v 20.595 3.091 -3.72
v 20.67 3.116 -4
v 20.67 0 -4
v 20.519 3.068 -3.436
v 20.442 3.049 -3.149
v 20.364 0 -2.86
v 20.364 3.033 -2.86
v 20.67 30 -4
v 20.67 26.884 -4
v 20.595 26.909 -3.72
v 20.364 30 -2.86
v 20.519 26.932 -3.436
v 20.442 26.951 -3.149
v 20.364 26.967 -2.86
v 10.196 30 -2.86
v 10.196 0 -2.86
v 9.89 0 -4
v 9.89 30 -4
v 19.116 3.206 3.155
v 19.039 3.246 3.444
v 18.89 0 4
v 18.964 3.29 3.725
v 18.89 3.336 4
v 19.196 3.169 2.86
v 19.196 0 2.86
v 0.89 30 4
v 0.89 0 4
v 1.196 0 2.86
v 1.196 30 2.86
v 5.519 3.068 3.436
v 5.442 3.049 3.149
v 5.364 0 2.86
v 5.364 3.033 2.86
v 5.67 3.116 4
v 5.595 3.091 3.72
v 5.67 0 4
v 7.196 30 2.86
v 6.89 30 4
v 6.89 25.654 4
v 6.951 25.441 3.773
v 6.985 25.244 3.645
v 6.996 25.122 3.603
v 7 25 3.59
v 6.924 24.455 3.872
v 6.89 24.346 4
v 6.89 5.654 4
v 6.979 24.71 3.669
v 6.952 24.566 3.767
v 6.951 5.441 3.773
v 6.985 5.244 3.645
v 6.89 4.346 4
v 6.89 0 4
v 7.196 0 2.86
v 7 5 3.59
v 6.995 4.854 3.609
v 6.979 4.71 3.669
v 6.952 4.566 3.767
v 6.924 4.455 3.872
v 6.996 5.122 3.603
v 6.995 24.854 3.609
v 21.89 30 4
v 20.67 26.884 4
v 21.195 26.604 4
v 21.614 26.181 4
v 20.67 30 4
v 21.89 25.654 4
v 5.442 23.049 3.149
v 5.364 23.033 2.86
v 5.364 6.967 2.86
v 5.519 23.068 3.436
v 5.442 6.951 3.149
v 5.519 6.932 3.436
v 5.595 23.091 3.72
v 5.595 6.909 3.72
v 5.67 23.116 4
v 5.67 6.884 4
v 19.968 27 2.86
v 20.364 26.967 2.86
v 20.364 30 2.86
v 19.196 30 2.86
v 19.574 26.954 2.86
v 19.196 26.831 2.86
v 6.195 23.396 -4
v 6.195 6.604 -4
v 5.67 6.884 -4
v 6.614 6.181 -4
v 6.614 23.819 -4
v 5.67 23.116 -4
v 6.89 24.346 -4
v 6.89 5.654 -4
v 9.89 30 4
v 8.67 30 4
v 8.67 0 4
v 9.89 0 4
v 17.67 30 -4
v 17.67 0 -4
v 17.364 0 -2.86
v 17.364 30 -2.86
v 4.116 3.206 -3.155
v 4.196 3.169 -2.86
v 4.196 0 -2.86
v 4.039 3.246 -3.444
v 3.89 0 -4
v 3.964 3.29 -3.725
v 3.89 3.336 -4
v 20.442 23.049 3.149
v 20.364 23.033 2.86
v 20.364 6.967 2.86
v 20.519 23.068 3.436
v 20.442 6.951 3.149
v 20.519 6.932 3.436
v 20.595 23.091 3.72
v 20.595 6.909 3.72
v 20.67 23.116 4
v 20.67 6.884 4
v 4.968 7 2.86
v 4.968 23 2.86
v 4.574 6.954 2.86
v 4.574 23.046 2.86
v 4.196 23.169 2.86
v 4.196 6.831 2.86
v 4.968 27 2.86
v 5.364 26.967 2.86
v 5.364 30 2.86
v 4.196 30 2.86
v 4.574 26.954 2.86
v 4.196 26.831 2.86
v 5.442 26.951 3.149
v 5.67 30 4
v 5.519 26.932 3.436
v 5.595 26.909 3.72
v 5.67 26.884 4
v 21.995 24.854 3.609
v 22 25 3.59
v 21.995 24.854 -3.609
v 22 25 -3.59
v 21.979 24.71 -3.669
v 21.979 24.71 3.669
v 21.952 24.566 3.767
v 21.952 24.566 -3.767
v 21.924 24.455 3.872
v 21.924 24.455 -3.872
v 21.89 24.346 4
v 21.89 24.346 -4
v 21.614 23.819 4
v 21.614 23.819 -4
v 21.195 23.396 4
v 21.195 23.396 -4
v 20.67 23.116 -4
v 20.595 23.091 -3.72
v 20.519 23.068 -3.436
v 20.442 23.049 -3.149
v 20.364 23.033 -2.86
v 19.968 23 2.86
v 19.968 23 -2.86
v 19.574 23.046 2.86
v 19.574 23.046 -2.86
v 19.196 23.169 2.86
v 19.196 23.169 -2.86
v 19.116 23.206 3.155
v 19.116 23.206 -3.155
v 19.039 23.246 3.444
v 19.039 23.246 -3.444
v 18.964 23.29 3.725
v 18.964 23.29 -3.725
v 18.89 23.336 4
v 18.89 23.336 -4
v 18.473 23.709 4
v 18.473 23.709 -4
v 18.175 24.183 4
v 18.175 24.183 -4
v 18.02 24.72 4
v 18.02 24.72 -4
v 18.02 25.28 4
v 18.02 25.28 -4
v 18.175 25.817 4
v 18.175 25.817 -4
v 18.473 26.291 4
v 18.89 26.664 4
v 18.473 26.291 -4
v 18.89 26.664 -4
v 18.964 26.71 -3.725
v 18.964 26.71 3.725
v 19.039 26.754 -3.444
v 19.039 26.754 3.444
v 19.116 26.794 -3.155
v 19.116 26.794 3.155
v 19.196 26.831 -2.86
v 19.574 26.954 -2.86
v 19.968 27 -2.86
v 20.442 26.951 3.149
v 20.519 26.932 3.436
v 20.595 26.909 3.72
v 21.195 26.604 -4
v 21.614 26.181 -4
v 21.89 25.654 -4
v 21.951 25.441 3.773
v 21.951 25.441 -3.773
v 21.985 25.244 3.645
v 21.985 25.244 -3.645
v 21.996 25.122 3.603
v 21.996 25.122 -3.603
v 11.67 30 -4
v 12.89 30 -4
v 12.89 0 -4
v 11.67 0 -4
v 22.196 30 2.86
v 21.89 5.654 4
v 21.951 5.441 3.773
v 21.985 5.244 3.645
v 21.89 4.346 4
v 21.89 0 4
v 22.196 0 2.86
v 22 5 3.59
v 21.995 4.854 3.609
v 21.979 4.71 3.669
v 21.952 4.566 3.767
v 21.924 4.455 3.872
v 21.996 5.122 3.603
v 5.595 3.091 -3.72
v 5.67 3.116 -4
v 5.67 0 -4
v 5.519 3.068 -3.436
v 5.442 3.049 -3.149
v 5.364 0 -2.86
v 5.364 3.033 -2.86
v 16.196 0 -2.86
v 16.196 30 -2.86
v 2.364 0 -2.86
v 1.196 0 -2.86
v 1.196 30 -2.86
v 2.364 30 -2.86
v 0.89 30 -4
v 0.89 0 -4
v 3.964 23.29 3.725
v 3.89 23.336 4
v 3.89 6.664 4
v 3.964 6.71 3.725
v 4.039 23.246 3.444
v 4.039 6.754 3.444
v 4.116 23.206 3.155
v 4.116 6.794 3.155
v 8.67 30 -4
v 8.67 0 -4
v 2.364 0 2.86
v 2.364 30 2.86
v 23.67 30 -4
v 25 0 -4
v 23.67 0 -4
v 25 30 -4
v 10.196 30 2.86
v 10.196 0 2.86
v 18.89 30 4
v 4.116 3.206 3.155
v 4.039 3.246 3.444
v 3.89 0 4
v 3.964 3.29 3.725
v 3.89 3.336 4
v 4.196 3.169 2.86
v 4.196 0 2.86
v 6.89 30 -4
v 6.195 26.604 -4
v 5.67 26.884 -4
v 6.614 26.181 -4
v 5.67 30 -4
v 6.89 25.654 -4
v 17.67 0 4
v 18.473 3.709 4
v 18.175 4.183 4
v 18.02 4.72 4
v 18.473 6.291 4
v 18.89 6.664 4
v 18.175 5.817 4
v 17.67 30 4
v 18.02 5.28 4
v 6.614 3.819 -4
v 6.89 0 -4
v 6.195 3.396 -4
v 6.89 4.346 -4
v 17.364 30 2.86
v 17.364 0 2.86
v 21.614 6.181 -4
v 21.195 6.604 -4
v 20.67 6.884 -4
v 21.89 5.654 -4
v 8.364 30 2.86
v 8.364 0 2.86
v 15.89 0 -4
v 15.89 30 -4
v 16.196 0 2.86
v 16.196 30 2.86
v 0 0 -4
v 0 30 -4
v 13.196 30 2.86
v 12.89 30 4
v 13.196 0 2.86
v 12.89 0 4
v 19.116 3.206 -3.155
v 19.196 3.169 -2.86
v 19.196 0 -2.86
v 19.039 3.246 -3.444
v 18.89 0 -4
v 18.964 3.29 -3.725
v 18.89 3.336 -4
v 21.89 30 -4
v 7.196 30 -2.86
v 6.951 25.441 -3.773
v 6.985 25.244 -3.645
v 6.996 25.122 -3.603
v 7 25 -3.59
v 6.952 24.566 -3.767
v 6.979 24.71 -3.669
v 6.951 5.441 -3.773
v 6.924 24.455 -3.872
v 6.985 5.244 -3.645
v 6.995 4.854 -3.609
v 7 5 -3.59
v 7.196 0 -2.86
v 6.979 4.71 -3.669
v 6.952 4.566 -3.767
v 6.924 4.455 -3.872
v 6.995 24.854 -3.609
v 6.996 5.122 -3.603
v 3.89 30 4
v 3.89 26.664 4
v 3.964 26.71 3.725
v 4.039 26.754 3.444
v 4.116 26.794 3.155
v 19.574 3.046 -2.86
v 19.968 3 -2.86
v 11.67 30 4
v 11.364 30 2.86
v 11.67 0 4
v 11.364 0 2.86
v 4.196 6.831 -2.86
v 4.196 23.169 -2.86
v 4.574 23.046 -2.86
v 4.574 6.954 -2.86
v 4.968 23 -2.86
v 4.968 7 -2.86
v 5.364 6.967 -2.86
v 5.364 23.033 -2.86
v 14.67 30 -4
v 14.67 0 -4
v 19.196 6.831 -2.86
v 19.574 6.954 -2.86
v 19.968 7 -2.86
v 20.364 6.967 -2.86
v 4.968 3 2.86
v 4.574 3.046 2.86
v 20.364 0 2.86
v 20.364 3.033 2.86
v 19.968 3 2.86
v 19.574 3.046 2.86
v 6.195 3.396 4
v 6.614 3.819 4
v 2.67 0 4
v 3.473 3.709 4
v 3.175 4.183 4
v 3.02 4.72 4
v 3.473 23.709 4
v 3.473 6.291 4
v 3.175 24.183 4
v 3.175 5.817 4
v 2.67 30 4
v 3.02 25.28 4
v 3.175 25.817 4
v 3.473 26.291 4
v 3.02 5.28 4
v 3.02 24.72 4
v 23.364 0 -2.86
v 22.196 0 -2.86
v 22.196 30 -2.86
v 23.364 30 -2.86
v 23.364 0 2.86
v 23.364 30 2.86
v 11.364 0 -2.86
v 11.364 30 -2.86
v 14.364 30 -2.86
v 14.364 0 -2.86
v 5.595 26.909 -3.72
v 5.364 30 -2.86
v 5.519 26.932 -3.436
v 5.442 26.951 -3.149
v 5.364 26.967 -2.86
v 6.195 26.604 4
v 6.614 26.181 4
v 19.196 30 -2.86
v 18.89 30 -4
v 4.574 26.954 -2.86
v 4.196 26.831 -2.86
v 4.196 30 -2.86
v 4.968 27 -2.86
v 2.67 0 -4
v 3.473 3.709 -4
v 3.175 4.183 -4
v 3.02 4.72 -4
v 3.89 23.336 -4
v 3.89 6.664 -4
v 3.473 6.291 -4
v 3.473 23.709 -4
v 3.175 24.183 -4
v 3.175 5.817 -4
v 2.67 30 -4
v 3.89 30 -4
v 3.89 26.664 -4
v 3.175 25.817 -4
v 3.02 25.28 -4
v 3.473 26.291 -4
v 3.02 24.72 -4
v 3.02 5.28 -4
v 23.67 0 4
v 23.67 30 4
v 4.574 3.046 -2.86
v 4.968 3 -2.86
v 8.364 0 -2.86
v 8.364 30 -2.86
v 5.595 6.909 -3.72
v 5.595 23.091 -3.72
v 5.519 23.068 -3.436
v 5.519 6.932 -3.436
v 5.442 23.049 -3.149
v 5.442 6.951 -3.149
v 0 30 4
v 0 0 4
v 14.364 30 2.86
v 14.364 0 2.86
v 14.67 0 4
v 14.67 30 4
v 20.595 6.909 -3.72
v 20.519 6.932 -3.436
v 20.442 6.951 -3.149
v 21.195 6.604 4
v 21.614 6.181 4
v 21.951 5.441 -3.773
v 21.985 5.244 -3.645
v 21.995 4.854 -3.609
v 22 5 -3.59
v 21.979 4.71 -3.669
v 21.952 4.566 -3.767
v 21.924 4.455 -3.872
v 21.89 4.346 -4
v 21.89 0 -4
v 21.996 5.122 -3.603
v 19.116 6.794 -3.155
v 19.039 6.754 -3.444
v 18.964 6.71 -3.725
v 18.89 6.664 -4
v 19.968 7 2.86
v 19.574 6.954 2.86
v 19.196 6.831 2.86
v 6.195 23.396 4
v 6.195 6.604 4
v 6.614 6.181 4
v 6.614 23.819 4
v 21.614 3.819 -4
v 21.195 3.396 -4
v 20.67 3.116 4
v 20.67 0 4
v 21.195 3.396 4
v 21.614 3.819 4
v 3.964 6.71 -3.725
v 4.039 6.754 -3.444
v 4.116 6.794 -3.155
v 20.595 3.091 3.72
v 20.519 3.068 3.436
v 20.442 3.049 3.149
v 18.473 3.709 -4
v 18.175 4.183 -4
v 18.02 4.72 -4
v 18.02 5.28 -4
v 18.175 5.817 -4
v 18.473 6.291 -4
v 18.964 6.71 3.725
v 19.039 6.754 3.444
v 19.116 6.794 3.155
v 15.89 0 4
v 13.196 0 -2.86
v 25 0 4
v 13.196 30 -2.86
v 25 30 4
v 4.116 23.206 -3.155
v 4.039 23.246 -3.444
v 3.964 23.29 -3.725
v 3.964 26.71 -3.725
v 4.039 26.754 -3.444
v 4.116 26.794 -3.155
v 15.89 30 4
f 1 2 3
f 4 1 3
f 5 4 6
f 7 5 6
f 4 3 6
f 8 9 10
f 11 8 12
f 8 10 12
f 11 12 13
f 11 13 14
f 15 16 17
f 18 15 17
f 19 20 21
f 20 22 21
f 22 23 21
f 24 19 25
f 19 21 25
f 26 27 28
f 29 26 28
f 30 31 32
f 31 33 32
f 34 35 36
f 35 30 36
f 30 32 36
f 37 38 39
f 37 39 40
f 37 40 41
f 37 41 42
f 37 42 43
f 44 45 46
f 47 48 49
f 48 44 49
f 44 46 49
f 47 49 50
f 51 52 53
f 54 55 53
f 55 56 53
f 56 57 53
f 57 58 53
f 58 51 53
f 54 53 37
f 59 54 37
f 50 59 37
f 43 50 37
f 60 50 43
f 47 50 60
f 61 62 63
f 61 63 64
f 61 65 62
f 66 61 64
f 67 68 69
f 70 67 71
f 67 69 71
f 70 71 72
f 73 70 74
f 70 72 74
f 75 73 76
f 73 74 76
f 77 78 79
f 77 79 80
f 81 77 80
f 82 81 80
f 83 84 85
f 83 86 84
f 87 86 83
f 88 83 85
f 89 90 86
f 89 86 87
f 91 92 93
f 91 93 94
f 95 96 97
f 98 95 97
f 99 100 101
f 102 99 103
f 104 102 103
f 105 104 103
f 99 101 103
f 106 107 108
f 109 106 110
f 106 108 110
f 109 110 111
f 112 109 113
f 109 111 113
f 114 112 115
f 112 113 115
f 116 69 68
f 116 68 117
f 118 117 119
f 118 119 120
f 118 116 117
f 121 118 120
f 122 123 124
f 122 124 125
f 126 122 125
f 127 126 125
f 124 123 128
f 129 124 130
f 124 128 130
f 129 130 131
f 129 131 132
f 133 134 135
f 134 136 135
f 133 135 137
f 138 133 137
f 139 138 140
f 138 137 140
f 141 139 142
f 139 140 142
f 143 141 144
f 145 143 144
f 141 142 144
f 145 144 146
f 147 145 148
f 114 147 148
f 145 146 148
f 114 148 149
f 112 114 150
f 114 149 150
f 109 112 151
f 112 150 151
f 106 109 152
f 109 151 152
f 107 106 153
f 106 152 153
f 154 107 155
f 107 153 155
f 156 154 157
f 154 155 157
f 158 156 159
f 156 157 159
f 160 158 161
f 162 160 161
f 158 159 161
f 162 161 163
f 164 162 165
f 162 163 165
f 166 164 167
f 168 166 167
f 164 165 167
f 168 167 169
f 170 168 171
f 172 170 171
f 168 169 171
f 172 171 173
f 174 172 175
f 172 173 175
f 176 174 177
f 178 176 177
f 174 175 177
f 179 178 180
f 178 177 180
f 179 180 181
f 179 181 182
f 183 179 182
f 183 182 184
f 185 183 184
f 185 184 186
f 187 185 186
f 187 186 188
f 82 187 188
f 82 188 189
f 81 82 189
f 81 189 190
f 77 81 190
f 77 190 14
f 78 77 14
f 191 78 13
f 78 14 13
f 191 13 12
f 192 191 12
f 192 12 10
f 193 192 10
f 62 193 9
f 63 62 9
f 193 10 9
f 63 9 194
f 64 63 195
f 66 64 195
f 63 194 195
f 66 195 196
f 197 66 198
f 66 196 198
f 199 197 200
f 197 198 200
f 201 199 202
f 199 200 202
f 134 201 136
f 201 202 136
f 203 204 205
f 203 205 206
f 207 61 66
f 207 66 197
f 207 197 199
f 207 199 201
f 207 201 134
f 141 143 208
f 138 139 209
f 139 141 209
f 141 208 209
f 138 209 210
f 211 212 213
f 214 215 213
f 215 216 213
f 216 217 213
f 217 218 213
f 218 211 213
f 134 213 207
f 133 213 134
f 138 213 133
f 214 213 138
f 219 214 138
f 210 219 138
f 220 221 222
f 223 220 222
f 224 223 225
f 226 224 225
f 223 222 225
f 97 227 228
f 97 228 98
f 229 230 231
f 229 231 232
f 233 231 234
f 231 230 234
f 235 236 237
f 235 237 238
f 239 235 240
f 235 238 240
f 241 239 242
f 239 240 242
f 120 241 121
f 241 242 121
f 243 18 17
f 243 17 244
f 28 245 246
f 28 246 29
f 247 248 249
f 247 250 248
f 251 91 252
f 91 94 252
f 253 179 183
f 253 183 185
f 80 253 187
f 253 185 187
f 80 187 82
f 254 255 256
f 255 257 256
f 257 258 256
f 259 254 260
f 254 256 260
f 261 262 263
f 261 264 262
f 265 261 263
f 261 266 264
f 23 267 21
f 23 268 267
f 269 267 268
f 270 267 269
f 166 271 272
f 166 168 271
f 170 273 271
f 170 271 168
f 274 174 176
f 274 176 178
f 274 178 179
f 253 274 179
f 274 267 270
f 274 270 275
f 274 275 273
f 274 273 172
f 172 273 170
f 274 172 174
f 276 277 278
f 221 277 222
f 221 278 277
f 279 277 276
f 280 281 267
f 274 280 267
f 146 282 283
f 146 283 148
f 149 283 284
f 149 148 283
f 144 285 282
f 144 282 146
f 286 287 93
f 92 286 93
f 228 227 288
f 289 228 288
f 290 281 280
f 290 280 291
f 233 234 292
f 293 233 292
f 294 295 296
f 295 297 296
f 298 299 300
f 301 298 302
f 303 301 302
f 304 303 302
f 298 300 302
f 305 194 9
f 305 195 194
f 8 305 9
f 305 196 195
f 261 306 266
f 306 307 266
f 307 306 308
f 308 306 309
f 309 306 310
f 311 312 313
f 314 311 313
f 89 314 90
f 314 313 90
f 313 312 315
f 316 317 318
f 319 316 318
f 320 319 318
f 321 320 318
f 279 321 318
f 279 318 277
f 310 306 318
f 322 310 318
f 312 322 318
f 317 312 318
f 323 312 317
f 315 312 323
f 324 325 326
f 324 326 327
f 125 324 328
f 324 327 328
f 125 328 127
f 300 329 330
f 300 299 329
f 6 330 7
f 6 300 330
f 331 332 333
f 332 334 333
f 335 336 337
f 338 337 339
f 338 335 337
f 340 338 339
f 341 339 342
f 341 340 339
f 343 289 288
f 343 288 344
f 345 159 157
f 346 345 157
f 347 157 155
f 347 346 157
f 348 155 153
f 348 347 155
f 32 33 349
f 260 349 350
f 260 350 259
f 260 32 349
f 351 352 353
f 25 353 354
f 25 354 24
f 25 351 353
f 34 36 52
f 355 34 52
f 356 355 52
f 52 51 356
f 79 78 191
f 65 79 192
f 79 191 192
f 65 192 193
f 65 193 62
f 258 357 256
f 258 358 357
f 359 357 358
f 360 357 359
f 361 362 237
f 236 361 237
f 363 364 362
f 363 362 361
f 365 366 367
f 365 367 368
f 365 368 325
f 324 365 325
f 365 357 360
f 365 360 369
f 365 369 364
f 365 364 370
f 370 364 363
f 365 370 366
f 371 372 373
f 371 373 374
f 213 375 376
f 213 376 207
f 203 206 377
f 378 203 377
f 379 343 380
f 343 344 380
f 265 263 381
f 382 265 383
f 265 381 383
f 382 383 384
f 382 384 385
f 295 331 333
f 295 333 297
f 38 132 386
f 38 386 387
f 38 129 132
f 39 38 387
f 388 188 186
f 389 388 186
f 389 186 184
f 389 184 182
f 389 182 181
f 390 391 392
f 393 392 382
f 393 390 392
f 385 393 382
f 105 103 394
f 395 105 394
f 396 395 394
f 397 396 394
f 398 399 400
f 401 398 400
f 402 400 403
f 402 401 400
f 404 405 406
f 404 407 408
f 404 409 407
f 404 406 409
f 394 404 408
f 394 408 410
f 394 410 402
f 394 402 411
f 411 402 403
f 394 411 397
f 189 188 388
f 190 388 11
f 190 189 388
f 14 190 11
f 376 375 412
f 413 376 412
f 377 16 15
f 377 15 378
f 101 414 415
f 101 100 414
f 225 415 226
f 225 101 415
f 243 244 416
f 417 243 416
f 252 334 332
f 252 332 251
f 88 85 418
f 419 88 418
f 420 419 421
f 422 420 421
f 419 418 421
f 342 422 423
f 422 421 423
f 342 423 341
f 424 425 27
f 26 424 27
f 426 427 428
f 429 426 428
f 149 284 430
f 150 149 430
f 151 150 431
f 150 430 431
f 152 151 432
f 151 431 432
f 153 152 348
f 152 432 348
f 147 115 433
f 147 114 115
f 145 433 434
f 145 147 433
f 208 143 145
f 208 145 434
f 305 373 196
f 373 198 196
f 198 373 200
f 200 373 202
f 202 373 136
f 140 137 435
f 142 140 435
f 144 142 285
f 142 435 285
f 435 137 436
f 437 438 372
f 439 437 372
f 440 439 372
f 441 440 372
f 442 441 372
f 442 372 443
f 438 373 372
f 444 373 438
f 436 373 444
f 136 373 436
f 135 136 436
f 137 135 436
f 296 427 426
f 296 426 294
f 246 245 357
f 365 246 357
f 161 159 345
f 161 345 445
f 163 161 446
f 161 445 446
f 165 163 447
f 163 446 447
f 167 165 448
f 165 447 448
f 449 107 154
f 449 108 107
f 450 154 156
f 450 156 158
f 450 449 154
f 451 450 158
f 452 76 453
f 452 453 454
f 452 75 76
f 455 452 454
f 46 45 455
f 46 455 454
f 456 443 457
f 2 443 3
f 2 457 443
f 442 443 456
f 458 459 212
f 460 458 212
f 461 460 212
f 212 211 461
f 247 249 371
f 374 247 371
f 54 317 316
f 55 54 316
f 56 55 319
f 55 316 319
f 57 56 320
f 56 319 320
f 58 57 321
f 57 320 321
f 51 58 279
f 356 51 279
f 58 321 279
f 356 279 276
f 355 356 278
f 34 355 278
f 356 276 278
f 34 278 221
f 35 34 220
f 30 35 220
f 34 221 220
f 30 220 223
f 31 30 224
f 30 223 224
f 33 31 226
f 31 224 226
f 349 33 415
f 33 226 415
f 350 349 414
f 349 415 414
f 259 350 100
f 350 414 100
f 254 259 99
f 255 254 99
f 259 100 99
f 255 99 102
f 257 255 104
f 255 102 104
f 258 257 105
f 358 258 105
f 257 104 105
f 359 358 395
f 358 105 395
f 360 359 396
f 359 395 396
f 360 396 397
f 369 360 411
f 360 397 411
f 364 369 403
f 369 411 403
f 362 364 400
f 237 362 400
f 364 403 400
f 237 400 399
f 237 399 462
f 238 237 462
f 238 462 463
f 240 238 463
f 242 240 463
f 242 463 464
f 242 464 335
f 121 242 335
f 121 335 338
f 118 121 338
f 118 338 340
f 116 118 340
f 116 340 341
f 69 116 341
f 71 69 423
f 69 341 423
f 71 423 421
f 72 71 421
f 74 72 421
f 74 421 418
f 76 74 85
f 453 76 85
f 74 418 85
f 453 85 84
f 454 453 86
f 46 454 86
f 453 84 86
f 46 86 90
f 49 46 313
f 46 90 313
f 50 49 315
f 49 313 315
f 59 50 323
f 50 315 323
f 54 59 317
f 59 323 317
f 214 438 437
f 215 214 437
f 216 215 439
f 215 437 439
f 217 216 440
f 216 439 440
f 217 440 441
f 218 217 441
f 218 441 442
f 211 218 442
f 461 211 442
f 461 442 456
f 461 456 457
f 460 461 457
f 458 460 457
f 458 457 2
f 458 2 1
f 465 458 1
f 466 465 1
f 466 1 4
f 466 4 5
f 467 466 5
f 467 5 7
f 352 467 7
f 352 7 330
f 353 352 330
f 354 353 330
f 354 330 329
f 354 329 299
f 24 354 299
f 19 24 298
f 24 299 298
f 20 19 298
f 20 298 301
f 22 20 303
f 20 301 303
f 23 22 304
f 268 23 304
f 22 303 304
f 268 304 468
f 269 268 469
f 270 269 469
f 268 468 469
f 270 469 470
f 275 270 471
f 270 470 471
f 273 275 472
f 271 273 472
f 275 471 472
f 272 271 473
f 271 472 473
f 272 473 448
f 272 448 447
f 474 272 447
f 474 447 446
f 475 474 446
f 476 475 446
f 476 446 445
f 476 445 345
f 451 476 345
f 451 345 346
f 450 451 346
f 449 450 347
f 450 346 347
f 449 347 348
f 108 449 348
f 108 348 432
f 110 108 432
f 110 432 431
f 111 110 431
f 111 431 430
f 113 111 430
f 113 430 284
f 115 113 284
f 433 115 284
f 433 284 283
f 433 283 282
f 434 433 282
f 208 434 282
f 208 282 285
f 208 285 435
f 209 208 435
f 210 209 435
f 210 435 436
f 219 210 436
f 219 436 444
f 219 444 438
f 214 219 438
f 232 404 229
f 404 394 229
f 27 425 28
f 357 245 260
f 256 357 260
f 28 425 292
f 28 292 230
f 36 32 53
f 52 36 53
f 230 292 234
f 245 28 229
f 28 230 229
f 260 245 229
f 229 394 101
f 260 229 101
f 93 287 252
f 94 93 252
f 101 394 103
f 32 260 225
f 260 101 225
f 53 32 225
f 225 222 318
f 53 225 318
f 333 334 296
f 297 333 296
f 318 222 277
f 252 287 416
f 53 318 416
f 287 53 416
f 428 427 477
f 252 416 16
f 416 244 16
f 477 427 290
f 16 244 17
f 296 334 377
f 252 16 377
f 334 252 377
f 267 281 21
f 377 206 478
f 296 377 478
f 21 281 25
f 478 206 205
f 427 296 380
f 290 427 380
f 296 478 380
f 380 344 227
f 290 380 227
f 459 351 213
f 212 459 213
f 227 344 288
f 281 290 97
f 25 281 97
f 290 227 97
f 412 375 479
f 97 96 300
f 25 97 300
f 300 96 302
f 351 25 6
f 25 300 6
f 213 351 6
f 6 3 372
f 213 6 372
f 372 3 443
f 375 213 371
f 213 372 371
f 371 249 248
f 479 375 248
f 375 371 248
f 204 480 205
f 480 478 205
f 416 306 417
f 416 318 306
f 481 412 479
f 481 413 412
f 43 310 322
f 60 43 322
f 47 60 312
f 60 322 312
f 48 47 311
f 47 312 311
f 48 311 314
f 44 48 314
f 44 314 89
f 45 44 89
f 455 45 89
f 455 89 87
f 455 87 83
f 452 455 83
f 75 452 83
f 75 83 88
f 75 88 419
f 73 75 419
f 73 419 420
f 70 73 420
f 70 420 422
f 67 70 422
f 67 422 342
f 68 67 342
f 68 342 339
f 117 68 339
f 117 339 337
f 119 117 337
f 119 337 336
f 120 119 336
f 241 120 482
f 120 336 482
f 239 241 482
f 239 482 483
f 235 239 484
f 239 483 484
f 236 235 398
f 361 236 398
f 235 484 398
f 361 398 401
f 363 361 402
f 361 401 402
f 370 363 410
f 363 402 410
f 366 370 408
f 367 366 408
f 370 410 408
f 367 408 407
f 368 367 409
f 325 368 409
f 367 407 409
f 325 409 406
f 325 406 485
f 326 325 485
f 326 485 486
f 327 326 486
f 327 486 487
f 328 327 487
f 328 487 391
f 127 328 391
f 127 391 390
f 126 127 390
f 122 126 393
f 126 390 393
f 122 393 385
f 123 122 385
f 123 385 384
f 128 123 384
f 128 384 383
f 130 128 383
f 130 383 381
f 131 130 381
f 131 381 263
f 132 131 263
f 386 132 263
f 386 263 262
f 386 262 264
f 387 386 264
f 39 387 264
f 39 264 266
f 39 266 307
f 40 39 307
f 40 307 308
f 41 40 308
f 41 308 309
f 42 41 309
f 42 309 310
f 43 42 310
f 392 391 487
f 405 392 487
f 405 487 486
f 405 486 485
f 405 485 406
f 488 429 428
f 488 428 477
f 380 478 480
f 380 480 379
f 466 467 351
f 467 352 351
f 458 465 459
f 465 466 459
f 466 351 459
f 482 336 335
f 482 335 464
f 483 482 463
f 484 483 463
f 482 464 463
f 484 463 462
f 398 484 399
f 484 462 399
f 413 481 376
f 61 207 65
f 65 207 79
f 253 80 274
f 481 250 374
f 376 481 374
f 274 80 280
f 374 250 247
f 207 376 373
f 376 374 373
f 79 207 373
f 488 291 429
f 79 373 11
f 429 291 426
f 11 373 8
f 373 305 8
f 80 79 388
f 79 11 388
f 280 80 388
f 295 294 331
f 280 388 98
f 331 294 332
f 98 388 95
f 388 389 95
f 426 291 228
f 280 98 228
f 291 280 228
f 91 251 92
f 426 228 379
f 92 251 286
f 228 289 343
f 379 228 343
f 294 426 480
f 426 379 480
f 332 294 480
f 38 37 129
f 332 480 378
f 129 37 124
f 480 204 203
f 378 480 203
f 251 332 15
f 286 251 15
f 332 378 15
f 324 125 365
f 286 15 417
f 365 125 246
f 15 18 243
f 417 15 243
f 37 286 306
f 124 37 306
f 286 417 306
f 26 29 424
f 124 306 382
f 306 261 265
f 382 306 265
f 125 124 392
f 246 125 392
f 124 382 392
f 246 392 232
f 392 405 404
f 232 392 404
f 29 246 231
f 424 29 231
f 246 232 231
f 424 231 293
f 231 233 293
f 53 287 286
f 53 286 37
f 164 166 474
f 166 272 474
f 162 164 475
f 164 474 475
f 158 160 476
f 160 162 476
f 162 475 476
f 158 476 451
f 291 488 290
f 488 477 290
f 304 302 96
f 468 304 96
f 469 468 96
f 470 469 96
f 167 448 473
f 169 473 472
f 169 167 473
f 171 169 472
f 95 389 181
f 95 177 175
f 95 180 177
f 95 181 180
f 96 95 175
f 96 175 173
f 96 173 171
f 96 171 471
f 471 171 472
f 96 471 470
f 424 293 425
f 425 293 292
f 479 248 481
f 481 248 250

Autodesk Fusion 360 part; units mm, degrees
sketch "Sketch1" plane through (0, 0, 0) normal (0, 0, 1) x (1, 0, 0)
  line L0 (0, 0) -> (25, 0)
  line L1 (25, 0) -> (25, 30)
  line L2 (25, 30) -> (0, 30)
  line L3 (0, 30) -> (0, 0)
  dimension "d1" = 25
  dimension "d2" = 30
extrude "Extrude1" add sketch "Sketch1" along normal blind 4
sketch "Sketch2" plane through (0, 0, 0) normal (0, -1, 0) x (1, 0, 0)
  line L0 (0, 0) -> (25, 0)
  line L1 (25, 0) -> (25, 4)
  line L2 (25, 4) -> (0, 4)
  line L3 (0, 4) -> (0, 0)
  line L4 (25, 2.86) -> (0, 2.86)
  line L5 (0.89, 4) -> (1.1955, 2.86)
  line L6 (2.3645, 2.86) -> (2.67, 4)
  line L7 (3.89, 4) -> (4.1955, 2.86)
  line L8 (5.3645, 2.86) -> (5.67, 4)
  line L9 (6.89, 4) -> (7.1955, 2.86)
  line L10 (8.3645, 2.86) -> (8.67, 4)
  line L11 (9.89, 4) -> (10.1955, 2.86)
  line L12 (11.3645, 2.86) -> (11.67, 4)
  line L13 (12.89, 4) -> (13.1955, 2.86)
  line L14 (14.3645, 2.86) -> (14.67, 4)
  line L15 (15.89, 4) -> (16.1955, 2.86)
  line L16 (17.3645, 2.86) -> (17.67, 4)
  line L17 (18.89, 4) -> (19.1955, 2.86)
  line L18 (20.3645, 2.86) -> (20.67, 4)
  line L19 (21.89, 4) -> (22.1955, 2.86)
  line L20 (23.3645, 2.86) -> (23.67, 4)
  dimension "d5" = 1.14
  dimension "d7" = 1.78
  dimension "d8" = 0.89
  dimension "d11" = 3
  dimension "d12" = 0
  dimension "d15" = 30
extrude "Extrude2" cut sketch "Sketch2" against normal up to surface (30 mm away) contours L2 L4 L5 L6 | L2 L4 L19 L20 | L2 L4 L7 L8 | L2 L4 L17 L18 | L2 L4 L9 L10 | L2 L4 L15 L16 | L2 L4 L11 L12 | L2 L4 L13 L14
sketch "Sketch3" plane through (0, 0, 0) normal (0, 0, -1) x (1, 0, 0)
  line L0 (0, 0) -> (0, -30)
  line L1 (0, -30) -> (25, -30)
  line L2 (25, -30) -> (25, 0)
  line L3 (25, 0) -> (0, 0)
  line L4 (20, -25) -> (5, -25) construction
  line L5 (5, -25) -> (5, -5) construction
  line L6 (5, -5) -> (20, -5) construction
  line L7 (20, -5) -> (20, -25) construction
  circle A0 centre (20, -25) radius 2
  circle A1 centre (5, -25) radius 2
  circle A2 centre (20, -5) radius 2
  circle A3 centre (5, -5) radius 2
  point P0 (12.5, -25)
  point P1 (5, -15)
  point P2 (0, -15)
  point P3 (12.5, -30)
  dimension "d16" = 15
  dimension "d17" = 20
  dimension "d18" = 4
  dimension "d19" = 4
extrude "Extrude3" cut sketch "Sketch3" against normal through all contours A0 | A1 | A2 | A3
mirror "Mirror1" about plane through (0, 0, 0) normal (0, 0, -1) of bodies 1 merged
equation "d8 = ( 1.78 / 2 ) * 1 mm"
